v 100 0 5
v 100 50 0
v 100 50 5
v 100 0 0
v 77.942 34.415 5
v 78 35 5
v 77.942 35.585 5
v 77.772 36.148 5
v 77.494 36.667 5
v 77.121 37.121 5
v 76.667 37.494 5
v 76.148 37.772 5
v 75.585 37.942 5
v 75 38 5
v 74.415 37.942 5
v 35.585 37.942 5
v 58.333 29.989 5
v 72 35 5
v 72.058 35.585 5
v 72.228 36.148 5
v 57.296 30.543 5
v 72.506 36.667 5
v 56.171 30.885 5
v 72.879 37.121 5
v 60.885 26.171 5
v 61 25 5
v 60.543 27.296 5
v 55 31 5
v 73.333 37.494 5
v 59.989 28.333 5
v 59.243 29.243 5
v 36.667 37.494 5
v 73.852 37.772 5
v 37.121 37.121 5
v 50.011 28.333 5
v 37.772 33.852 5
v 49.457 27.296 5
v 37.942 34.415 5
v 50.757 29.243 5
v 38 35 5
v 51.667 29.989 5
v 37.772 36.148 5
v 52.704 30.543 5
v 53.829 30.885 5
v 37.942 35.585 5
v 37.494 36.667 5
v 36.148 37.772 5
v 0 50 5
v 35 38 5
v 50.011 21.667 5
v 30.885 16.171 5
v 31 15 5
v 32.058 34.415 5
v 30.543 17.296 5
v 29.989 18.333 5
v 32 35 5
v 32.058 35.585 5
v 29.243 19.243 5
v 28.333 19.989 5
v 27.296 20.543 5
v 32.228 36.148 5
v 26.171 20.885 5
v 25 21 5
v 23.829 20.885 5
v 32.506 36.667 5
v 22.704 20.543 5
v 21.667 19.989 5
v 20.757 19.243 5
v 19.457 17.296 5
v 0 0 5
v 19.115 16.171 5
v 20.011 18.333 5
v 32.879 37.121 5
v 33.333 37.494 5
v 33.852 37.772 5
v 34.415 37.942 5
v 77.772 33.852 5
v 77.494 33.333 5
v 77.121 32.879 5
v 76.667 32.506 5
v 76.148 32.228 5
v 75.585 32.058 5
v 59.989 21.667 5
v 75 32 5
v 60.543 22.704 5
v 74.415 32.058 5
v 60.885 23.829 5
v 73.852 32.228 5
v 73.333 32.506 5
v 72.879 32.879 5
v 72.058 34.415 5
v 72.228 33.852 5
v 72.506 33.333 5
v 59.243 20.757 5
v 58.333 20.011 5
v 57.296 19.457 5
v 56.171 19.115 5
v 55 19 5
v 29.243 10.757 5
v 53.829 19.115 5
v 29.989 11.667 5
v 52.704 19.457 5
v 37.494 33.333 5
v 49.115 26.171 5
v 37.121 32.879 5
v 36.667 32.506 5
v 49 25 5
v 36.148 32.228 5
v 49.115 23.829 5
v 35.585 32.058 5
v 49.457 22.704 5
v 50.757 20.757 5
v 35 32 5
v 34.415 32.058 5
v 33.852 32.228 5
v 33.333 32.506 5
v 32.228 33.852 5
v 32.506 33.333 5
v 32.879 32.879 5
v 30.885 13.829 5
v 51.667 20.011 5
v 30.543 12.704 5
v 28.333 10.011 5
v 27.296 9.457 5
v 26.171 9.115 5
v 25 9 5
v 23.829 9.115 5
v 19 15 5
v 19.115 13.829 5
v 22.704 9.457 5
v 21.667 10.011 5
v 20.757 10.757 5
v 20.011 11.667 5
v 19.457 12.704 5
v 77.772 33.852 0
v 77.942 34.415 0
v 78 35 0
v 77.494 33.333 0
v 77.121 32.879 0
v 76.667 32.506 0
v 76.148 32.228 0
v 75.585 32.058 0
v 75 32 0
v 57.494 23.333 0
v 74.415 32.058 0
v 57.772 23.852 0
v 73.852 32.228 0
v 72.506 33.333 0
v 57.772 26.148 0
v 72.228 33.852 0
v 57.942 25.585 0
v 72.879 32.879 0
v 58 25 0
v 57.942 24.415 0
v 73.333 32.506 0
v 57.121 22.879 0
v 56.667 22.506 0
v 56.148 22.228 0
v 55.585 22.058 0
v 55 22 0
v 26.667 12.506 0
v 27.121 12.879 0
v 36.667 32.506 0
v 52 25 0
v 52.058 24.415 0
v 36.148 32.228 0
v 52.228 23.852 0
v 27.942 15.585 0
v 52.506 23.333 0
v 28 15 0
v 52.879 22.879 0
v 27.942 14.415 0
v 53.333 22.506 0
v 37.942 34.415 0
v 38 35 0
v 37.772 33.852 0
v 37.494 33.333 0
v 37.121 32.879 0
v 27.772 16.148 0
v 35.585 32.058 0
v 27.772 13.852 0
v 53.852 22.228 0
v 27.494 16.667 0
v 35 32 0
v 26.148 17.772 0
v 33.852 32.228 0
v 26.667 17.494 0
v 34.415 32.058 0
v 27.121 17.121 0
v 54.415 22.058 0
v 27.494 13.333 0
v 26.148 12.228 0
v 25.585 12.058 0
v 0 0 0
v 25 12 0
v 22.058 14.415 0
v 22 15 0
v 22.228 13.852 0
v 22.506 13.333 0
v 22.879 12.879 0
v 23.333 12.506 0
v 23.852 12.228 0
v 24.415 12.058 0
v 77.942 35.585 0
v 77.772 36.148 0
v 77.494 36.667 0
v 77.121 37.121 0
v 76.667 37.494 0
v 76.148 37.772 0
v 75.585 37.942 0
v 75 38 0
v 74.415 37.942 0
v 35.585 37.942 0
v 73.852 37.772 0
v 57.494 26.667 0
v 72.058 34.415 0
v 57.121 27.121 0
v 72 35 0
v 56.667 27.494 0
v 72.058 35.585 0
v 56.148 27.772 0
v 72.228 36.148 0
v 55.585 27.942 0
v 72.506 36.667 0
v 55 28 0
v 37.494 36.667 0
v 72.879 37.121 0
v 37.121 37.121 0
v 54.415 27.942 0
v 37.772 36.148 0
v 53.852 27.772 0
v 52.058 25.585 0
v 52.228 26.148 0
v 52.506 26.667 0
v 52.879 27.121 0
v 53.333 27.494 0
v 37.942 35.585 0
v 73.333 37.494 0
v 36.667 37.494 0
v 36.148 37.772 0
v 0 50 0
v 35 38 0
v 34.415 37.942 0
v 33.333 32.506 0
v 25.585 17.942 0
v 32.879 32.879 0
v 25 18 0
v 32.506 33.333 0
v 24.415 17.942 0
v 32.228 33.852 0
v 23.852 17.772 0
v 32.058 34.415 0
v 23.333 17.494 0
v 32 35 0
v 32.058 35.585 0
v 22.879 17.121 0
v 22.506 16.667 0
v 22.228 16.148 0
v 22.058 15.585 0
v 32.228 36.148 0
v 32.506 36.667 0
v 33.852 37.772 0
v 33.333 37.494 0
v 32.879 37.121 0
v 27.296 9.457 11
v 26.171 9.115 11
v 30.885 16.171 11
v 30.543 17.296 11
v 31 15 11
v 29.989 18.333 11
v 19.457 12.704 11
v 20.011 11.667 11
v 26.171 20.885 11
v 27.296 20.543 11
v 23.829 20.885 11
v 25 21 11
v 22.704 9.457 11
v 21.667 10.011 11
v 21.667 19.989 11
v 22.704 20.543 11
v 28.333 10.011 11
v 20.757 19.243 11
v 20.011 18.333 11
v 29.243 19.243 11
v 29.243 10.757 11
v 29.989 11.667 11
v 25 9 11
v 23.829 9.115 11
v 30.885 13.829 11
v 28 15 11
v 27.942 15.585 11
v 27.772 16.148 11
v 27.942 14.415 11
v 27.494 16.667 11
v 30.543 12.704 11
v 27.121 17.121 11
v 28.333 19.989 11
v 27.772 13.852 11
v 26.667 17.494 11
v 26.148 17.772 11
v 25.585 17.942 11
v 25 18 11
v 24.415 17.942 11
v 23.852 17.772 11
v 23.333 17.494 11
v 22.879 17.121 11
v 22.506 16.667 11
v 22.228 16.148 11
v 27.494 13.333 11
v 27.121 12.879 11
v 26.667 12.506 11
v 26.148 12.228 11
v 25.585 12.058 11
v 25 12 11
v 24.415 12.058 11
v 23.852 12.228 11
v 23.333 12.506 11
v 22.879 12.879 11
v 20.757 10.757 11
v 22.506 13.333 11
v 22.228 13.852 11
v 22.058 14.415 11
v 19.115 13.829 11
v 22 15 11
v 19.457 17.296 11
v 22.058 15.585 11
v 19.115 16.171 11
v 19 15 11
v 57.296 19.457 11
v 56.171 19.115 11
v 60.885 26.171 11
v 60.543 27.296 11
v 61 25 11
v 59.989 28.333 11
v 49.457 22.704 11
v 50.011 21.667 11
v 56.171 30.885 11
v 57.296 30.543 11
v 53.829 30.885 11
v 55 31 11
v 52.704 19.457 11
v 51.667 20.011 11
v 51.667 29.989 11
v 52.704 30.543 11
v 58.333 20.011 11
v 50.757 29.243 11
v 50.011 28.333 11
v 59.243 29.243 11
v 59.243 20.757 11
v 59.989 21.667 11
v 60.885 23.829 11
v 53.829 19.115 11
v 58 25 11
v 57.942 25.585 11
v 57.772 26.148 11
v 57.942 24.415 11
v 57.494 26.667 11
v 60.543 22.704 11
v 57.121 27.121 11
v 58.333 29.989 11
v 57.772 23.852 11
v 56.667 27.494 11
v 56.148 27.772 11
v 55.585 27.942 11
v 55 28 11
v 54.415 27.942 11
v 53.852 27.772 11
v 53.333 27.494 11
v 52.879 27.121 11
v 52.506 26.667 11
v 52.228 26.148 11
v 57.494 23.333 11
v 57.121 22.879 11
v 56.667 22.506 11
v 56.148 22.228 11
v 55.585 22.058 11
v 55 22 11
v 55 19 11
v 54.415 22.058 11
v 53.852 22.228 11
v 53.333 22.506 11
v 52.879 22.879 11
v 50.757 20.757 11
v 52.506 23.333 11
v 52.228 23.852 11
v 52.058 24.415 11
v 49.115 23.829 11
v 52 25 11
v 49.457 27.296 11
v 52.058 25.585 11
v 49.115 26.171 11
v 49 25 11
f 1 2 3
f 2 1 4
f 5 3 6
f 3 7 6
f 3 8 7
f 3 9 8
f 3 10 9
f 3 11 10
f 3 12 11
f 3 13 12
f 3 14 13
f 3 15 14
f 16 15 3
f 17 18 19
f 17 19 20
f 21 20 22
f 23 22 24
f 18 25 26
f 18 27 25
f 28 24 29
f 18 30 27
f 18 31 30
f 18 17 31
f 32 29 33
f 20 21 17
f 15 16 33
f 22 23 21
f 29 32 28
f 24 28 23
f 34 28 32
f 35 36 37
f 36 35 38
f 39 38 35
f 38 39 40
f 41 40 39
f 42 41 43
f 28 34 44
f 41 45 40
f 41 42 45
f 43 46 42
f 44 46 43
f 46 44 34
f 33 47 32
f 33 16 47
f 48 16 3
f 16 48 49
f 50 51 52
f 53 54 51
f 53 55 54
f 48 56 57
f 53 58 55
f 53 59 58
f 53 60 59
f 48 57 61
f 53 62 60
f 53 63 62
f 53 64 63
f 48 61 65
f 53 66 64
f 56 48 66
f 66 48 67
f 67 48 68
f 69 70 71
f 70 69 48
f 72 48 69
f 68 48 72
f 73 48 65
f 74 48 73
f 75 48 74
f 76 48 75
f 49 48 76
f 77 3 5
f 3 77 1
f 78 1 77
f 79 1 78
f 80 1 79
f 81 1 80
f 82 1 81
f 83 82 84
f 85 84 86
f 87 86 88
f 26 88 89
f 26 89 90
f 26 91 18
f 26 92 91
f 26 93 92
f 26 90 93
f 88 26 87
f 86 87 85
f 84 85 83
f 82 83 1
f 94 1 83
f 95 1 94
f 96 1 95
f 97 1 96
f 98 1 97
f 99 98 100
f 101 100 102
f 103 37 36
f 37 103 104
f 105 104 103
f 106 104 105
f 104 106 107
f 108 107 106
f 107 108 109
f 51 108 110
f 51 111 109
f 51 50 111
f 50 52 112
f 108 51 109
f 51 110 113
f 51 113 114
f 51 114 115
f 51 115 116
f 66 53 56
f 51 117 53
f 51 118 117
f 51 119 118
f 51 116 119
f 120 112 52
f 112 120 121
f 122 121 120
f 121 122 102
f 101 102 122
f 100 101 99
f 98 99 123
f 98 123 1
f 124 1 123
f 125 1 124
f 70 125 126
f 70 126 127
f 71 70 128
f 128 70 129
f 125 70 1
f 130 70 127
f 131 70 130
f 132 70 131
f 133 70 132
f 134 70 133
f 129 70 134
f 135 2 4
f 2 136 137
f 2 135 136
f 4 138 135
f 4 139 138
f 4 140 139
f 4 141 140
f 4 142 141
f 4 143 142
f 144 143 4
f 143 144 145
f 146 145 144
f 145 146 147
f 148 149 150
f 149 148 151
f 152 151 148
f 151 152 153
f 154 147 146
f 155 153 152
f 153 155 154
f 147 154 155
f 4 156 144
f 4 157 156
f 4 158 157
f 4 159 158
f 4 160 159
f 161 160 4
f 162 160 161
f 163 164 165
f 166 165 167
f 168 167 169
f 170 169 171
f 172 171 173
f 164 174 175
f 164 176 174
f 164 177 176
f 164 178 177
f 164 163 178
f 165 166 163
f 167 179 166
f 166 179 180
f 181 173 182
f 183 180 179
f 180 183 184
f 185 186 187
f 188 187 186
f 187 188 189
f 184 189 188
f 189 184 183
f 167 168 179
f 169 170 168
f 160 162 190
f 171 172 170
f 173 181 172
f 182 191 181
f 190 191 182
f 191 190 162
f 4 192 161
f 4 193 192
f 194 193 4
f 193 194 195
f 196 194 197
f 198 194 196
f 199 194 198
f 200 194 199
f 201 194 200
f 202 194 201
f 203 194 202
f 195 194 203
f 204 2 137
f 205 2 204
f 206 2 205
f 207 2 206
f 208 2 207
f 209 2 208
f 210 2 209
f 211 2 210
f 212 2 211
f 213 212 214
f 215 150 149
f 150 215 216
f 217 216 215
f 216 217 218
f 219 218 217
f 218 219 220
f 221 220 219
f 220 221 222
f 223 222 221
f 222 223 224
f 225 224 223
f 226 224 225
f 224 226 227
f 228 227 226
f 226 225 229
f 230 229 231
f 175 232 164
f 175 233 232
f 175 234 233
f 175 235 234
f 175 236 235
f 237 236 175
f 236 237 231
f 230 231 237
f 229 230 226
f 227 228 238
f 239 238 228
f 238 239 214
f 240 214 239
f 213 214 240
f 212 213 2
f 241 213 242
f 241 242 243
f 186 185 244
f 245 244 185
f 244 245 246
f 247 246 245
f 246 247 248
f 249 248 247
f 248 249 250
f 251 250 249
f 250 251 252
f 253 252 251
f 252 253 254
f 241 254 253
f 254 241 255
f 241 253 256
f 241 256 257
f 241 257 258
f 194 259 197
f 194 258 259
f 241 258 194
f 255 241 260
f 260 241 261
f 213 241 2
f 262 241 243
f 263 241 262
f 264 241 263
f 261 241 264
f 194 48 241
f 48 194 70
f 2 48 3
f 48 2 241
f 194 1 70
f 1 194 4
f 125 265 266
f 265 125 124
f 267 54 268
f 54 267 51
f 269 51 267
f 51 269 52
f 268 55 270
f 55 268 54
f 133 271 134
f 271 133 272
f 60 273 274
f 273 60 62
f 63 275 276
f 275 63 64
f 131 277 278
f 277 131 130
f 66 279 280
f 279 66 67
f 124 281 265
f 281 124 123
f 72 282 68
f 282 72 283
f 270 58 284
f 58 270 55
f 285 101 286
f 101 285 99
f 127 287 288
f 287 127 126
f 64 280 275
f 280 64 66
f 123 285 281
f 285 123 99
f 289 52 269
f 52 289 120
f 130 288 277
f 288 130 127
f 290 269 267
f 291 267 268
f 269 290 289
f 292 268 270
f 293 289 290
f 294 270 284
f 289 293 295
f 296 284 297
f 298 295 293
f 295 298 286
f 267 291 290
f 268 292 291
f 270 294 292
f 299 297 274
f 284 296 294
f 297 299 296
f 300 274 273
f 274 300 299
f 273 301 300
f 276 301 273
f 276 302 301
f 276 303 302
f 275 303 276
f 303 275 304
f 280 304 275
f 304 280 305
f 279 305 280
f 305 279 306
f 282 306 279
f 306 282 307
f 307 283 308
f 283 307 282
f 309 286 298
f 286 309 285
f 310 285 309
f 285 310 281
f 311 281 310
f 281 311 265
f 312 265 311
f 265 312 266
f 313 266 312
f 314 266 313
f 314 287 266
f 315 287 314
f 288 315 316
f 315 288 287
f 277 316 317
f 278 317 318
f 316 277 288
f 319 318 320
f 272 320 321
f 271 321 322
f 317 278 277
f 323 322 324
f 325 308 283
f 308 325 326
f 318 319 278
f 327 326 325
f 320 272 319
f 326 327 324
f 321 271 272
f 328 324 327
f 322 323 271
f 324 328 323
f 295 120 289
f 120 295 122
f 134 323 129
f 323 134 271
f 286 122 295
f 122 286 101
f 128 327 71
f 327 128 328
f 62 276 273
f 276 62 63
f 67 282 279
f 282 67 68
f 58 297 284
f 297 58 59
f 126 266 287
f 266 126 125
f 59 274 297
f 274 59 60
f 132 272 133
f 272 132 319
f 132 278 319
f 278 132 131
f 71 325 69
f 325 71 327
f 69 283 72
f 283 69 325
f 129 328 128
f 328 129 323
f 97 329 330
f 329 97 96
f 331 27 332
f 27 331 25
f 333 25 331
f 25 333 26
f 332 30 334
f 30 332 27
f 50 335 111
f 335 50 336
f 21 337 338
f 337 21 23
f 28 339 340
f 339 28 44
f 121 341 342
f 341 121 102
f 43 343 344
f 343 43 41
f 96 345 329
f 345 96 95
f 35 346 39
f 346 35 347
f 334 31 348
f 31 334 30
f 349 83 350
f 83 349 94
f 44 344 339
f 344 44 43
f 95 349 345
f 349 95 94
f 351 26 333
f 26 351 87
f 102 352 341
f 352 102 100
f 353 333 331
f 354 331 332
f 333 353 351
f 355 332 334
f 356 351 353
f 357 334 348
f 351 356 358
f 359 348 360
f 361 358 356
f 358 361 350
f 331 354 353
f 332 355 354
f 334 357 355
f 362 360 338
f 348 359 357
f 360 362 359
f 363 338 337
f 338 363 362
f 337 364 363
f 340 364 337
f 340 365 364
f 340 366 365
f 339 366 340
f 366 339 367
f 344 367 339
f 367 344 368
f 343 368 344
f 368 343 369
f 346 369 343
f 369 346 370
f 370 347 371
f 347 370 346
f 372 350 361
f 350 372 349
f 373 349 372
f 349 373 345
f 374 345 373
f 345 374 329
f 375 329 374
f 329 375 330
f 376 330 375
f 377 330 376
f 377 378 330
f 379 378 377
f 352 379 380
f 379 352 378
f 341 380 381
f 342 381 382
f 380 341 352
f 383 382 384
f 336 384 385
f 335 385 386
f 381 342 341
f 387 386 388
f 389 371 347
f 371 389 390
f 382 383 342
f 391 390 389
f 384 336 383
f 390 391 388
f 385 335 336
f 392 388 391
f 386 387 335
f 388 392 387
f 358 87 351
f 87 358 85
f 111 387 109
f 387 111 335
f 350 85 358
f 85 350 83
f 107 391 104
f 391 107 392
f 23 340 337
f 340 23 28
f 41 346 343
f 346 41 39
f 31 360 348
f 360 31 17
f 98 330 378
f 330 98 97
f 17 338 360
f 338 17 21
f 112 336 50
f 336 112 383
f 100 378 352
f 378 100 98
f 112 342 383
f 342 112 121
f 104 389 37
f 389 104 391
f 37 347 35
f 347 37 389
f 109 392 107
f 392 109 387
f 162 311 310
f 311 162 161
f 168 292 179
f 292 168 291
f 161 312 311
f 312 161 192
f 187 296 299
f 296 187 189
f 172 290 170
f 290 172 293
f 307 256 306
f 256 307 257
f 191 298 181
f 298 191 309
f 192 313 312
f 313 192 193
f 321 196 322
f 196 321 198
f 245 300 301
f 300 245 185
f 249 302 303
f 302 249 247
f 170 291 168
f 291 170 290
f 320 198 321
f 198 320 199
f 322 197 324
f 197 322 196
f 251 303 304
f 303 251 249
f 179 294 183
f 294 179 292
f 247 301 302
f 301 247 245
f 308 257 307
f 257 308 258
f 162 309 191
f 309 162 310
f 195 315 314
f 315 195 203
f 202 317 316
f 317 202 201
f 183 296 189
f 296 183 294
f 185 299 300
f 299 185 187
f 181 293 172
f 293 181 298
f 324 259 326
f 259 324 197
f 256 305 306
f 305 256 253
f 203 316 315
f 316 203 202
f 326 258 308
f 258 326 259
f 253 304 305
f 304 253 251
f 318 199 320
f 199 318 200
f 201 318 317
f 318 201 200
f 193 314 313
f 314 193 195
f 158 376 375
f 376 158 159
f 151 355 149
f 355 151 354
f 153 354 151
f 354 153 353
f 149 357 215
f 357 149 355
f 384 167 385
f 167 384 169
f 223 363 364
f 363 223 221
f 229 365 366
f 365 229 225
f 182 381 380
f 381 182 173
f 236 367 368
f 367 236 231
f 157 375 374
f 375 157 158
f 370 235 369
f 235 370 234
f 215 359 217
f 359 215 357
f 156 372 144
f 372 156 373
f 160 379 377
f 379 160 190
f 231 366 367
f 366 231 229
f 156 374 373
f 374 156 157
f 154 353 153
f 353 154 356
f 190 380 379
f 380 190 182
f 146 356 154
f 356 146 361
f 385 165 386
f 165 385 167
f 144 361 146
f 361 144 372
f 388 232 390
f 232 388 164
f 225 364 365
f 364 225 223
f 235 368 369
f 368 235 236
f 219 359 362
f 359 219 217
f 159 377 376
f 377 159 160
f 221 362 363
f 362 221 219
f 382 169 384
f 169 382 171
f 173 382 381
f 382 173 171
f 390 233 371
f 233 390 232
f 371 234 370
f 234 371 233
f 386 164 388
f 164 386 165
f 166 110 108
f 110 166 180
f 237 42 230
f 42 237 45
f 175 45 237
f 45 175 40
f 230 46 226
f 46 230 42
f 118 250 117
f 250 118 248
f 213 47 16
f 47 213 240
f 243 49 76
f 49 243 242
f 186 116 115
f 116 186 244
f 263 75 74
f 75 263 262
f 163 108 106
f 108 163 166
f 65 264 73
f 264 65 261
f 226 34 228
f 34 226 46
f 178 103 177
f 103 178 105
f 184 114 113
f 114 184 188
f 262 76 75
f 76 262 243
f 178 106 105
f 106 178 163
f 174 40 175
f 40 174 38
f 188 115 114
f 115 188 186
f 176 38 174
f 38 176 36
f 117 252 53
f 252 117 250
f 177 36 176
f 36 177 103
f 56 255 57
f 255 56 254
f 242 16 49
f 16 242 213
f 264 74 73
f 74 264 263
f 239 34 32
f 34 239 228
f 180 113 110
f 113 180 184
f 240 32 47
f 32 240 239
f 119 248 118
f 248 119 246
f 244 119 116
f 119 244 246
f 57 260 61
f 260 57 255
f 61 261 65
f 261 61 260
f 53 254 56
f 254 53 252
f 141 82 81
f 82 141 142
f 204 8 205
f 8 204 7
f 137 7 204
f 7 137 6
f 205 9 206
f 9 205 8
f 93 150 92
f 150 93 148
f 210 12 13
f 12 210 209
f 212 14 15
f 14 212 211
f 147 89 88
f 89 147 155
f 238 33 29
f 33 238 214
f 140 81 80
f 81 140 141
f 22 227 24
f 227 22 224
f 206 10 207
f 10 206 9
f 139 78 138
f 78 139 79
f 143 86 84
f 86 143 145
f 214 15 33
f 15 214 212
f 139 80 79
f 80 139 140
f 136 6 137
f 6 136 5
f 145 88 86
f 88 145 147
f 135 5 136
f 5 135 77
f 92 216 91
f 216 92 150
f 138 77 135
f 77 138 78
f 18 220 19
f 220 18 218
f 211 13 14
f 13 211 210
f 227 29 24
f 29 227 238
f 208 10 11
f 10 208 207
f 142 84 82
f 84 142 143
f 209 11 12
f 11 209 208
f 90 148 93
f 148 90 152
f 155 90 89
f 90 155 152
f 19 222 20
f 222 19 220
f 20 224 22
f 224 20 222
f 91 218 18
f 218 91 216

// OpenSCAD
$fn = 32;

// ----------------------------------------------------------------------
// Mixed field: bosses and holes at given coordinates
// ----------------------------------------------------------------------

// --- parameters (mm) ---
plate_l = 100;            // plate length, X
plate_w = 50;             // plate width, Y
plate_t = 5;              // plate thickness, Z
boss_d = 12;              // boss diameter
boss_h = 6;               // boss height above the plate
hole_d = 6;               // through hole diameter
fit_tol = 0.1;            // tolerance for press fits, mm
free_tol = 0.5;           // tolerance for clearance fits, mm

total_h = plate_t + boss_h;  // overall height

difference() {
  union() {
    cube([plate_l, plate_w, plate_t]);
    translate([25, 15, plate_t]) cylinder(h = boss_h, d = boss_d);
    translate([55, 25, plate_t]) cylinder(h = boss_h, d = boss_d);
  }
  translate([25, 15, -1]) cylinder(h = total_h + 2, d = boss_d / 2);
  translate([55, 25, -1]) cylinder(h = total_h + 2, d = boss_d / 2);
  translate([35, 35, -1]) cylinder(h = plate_t + 2, d = hole_d);
  translate([75, 35, -1]) cylinder(h = plate_t + 2, d = hole_d);
}
